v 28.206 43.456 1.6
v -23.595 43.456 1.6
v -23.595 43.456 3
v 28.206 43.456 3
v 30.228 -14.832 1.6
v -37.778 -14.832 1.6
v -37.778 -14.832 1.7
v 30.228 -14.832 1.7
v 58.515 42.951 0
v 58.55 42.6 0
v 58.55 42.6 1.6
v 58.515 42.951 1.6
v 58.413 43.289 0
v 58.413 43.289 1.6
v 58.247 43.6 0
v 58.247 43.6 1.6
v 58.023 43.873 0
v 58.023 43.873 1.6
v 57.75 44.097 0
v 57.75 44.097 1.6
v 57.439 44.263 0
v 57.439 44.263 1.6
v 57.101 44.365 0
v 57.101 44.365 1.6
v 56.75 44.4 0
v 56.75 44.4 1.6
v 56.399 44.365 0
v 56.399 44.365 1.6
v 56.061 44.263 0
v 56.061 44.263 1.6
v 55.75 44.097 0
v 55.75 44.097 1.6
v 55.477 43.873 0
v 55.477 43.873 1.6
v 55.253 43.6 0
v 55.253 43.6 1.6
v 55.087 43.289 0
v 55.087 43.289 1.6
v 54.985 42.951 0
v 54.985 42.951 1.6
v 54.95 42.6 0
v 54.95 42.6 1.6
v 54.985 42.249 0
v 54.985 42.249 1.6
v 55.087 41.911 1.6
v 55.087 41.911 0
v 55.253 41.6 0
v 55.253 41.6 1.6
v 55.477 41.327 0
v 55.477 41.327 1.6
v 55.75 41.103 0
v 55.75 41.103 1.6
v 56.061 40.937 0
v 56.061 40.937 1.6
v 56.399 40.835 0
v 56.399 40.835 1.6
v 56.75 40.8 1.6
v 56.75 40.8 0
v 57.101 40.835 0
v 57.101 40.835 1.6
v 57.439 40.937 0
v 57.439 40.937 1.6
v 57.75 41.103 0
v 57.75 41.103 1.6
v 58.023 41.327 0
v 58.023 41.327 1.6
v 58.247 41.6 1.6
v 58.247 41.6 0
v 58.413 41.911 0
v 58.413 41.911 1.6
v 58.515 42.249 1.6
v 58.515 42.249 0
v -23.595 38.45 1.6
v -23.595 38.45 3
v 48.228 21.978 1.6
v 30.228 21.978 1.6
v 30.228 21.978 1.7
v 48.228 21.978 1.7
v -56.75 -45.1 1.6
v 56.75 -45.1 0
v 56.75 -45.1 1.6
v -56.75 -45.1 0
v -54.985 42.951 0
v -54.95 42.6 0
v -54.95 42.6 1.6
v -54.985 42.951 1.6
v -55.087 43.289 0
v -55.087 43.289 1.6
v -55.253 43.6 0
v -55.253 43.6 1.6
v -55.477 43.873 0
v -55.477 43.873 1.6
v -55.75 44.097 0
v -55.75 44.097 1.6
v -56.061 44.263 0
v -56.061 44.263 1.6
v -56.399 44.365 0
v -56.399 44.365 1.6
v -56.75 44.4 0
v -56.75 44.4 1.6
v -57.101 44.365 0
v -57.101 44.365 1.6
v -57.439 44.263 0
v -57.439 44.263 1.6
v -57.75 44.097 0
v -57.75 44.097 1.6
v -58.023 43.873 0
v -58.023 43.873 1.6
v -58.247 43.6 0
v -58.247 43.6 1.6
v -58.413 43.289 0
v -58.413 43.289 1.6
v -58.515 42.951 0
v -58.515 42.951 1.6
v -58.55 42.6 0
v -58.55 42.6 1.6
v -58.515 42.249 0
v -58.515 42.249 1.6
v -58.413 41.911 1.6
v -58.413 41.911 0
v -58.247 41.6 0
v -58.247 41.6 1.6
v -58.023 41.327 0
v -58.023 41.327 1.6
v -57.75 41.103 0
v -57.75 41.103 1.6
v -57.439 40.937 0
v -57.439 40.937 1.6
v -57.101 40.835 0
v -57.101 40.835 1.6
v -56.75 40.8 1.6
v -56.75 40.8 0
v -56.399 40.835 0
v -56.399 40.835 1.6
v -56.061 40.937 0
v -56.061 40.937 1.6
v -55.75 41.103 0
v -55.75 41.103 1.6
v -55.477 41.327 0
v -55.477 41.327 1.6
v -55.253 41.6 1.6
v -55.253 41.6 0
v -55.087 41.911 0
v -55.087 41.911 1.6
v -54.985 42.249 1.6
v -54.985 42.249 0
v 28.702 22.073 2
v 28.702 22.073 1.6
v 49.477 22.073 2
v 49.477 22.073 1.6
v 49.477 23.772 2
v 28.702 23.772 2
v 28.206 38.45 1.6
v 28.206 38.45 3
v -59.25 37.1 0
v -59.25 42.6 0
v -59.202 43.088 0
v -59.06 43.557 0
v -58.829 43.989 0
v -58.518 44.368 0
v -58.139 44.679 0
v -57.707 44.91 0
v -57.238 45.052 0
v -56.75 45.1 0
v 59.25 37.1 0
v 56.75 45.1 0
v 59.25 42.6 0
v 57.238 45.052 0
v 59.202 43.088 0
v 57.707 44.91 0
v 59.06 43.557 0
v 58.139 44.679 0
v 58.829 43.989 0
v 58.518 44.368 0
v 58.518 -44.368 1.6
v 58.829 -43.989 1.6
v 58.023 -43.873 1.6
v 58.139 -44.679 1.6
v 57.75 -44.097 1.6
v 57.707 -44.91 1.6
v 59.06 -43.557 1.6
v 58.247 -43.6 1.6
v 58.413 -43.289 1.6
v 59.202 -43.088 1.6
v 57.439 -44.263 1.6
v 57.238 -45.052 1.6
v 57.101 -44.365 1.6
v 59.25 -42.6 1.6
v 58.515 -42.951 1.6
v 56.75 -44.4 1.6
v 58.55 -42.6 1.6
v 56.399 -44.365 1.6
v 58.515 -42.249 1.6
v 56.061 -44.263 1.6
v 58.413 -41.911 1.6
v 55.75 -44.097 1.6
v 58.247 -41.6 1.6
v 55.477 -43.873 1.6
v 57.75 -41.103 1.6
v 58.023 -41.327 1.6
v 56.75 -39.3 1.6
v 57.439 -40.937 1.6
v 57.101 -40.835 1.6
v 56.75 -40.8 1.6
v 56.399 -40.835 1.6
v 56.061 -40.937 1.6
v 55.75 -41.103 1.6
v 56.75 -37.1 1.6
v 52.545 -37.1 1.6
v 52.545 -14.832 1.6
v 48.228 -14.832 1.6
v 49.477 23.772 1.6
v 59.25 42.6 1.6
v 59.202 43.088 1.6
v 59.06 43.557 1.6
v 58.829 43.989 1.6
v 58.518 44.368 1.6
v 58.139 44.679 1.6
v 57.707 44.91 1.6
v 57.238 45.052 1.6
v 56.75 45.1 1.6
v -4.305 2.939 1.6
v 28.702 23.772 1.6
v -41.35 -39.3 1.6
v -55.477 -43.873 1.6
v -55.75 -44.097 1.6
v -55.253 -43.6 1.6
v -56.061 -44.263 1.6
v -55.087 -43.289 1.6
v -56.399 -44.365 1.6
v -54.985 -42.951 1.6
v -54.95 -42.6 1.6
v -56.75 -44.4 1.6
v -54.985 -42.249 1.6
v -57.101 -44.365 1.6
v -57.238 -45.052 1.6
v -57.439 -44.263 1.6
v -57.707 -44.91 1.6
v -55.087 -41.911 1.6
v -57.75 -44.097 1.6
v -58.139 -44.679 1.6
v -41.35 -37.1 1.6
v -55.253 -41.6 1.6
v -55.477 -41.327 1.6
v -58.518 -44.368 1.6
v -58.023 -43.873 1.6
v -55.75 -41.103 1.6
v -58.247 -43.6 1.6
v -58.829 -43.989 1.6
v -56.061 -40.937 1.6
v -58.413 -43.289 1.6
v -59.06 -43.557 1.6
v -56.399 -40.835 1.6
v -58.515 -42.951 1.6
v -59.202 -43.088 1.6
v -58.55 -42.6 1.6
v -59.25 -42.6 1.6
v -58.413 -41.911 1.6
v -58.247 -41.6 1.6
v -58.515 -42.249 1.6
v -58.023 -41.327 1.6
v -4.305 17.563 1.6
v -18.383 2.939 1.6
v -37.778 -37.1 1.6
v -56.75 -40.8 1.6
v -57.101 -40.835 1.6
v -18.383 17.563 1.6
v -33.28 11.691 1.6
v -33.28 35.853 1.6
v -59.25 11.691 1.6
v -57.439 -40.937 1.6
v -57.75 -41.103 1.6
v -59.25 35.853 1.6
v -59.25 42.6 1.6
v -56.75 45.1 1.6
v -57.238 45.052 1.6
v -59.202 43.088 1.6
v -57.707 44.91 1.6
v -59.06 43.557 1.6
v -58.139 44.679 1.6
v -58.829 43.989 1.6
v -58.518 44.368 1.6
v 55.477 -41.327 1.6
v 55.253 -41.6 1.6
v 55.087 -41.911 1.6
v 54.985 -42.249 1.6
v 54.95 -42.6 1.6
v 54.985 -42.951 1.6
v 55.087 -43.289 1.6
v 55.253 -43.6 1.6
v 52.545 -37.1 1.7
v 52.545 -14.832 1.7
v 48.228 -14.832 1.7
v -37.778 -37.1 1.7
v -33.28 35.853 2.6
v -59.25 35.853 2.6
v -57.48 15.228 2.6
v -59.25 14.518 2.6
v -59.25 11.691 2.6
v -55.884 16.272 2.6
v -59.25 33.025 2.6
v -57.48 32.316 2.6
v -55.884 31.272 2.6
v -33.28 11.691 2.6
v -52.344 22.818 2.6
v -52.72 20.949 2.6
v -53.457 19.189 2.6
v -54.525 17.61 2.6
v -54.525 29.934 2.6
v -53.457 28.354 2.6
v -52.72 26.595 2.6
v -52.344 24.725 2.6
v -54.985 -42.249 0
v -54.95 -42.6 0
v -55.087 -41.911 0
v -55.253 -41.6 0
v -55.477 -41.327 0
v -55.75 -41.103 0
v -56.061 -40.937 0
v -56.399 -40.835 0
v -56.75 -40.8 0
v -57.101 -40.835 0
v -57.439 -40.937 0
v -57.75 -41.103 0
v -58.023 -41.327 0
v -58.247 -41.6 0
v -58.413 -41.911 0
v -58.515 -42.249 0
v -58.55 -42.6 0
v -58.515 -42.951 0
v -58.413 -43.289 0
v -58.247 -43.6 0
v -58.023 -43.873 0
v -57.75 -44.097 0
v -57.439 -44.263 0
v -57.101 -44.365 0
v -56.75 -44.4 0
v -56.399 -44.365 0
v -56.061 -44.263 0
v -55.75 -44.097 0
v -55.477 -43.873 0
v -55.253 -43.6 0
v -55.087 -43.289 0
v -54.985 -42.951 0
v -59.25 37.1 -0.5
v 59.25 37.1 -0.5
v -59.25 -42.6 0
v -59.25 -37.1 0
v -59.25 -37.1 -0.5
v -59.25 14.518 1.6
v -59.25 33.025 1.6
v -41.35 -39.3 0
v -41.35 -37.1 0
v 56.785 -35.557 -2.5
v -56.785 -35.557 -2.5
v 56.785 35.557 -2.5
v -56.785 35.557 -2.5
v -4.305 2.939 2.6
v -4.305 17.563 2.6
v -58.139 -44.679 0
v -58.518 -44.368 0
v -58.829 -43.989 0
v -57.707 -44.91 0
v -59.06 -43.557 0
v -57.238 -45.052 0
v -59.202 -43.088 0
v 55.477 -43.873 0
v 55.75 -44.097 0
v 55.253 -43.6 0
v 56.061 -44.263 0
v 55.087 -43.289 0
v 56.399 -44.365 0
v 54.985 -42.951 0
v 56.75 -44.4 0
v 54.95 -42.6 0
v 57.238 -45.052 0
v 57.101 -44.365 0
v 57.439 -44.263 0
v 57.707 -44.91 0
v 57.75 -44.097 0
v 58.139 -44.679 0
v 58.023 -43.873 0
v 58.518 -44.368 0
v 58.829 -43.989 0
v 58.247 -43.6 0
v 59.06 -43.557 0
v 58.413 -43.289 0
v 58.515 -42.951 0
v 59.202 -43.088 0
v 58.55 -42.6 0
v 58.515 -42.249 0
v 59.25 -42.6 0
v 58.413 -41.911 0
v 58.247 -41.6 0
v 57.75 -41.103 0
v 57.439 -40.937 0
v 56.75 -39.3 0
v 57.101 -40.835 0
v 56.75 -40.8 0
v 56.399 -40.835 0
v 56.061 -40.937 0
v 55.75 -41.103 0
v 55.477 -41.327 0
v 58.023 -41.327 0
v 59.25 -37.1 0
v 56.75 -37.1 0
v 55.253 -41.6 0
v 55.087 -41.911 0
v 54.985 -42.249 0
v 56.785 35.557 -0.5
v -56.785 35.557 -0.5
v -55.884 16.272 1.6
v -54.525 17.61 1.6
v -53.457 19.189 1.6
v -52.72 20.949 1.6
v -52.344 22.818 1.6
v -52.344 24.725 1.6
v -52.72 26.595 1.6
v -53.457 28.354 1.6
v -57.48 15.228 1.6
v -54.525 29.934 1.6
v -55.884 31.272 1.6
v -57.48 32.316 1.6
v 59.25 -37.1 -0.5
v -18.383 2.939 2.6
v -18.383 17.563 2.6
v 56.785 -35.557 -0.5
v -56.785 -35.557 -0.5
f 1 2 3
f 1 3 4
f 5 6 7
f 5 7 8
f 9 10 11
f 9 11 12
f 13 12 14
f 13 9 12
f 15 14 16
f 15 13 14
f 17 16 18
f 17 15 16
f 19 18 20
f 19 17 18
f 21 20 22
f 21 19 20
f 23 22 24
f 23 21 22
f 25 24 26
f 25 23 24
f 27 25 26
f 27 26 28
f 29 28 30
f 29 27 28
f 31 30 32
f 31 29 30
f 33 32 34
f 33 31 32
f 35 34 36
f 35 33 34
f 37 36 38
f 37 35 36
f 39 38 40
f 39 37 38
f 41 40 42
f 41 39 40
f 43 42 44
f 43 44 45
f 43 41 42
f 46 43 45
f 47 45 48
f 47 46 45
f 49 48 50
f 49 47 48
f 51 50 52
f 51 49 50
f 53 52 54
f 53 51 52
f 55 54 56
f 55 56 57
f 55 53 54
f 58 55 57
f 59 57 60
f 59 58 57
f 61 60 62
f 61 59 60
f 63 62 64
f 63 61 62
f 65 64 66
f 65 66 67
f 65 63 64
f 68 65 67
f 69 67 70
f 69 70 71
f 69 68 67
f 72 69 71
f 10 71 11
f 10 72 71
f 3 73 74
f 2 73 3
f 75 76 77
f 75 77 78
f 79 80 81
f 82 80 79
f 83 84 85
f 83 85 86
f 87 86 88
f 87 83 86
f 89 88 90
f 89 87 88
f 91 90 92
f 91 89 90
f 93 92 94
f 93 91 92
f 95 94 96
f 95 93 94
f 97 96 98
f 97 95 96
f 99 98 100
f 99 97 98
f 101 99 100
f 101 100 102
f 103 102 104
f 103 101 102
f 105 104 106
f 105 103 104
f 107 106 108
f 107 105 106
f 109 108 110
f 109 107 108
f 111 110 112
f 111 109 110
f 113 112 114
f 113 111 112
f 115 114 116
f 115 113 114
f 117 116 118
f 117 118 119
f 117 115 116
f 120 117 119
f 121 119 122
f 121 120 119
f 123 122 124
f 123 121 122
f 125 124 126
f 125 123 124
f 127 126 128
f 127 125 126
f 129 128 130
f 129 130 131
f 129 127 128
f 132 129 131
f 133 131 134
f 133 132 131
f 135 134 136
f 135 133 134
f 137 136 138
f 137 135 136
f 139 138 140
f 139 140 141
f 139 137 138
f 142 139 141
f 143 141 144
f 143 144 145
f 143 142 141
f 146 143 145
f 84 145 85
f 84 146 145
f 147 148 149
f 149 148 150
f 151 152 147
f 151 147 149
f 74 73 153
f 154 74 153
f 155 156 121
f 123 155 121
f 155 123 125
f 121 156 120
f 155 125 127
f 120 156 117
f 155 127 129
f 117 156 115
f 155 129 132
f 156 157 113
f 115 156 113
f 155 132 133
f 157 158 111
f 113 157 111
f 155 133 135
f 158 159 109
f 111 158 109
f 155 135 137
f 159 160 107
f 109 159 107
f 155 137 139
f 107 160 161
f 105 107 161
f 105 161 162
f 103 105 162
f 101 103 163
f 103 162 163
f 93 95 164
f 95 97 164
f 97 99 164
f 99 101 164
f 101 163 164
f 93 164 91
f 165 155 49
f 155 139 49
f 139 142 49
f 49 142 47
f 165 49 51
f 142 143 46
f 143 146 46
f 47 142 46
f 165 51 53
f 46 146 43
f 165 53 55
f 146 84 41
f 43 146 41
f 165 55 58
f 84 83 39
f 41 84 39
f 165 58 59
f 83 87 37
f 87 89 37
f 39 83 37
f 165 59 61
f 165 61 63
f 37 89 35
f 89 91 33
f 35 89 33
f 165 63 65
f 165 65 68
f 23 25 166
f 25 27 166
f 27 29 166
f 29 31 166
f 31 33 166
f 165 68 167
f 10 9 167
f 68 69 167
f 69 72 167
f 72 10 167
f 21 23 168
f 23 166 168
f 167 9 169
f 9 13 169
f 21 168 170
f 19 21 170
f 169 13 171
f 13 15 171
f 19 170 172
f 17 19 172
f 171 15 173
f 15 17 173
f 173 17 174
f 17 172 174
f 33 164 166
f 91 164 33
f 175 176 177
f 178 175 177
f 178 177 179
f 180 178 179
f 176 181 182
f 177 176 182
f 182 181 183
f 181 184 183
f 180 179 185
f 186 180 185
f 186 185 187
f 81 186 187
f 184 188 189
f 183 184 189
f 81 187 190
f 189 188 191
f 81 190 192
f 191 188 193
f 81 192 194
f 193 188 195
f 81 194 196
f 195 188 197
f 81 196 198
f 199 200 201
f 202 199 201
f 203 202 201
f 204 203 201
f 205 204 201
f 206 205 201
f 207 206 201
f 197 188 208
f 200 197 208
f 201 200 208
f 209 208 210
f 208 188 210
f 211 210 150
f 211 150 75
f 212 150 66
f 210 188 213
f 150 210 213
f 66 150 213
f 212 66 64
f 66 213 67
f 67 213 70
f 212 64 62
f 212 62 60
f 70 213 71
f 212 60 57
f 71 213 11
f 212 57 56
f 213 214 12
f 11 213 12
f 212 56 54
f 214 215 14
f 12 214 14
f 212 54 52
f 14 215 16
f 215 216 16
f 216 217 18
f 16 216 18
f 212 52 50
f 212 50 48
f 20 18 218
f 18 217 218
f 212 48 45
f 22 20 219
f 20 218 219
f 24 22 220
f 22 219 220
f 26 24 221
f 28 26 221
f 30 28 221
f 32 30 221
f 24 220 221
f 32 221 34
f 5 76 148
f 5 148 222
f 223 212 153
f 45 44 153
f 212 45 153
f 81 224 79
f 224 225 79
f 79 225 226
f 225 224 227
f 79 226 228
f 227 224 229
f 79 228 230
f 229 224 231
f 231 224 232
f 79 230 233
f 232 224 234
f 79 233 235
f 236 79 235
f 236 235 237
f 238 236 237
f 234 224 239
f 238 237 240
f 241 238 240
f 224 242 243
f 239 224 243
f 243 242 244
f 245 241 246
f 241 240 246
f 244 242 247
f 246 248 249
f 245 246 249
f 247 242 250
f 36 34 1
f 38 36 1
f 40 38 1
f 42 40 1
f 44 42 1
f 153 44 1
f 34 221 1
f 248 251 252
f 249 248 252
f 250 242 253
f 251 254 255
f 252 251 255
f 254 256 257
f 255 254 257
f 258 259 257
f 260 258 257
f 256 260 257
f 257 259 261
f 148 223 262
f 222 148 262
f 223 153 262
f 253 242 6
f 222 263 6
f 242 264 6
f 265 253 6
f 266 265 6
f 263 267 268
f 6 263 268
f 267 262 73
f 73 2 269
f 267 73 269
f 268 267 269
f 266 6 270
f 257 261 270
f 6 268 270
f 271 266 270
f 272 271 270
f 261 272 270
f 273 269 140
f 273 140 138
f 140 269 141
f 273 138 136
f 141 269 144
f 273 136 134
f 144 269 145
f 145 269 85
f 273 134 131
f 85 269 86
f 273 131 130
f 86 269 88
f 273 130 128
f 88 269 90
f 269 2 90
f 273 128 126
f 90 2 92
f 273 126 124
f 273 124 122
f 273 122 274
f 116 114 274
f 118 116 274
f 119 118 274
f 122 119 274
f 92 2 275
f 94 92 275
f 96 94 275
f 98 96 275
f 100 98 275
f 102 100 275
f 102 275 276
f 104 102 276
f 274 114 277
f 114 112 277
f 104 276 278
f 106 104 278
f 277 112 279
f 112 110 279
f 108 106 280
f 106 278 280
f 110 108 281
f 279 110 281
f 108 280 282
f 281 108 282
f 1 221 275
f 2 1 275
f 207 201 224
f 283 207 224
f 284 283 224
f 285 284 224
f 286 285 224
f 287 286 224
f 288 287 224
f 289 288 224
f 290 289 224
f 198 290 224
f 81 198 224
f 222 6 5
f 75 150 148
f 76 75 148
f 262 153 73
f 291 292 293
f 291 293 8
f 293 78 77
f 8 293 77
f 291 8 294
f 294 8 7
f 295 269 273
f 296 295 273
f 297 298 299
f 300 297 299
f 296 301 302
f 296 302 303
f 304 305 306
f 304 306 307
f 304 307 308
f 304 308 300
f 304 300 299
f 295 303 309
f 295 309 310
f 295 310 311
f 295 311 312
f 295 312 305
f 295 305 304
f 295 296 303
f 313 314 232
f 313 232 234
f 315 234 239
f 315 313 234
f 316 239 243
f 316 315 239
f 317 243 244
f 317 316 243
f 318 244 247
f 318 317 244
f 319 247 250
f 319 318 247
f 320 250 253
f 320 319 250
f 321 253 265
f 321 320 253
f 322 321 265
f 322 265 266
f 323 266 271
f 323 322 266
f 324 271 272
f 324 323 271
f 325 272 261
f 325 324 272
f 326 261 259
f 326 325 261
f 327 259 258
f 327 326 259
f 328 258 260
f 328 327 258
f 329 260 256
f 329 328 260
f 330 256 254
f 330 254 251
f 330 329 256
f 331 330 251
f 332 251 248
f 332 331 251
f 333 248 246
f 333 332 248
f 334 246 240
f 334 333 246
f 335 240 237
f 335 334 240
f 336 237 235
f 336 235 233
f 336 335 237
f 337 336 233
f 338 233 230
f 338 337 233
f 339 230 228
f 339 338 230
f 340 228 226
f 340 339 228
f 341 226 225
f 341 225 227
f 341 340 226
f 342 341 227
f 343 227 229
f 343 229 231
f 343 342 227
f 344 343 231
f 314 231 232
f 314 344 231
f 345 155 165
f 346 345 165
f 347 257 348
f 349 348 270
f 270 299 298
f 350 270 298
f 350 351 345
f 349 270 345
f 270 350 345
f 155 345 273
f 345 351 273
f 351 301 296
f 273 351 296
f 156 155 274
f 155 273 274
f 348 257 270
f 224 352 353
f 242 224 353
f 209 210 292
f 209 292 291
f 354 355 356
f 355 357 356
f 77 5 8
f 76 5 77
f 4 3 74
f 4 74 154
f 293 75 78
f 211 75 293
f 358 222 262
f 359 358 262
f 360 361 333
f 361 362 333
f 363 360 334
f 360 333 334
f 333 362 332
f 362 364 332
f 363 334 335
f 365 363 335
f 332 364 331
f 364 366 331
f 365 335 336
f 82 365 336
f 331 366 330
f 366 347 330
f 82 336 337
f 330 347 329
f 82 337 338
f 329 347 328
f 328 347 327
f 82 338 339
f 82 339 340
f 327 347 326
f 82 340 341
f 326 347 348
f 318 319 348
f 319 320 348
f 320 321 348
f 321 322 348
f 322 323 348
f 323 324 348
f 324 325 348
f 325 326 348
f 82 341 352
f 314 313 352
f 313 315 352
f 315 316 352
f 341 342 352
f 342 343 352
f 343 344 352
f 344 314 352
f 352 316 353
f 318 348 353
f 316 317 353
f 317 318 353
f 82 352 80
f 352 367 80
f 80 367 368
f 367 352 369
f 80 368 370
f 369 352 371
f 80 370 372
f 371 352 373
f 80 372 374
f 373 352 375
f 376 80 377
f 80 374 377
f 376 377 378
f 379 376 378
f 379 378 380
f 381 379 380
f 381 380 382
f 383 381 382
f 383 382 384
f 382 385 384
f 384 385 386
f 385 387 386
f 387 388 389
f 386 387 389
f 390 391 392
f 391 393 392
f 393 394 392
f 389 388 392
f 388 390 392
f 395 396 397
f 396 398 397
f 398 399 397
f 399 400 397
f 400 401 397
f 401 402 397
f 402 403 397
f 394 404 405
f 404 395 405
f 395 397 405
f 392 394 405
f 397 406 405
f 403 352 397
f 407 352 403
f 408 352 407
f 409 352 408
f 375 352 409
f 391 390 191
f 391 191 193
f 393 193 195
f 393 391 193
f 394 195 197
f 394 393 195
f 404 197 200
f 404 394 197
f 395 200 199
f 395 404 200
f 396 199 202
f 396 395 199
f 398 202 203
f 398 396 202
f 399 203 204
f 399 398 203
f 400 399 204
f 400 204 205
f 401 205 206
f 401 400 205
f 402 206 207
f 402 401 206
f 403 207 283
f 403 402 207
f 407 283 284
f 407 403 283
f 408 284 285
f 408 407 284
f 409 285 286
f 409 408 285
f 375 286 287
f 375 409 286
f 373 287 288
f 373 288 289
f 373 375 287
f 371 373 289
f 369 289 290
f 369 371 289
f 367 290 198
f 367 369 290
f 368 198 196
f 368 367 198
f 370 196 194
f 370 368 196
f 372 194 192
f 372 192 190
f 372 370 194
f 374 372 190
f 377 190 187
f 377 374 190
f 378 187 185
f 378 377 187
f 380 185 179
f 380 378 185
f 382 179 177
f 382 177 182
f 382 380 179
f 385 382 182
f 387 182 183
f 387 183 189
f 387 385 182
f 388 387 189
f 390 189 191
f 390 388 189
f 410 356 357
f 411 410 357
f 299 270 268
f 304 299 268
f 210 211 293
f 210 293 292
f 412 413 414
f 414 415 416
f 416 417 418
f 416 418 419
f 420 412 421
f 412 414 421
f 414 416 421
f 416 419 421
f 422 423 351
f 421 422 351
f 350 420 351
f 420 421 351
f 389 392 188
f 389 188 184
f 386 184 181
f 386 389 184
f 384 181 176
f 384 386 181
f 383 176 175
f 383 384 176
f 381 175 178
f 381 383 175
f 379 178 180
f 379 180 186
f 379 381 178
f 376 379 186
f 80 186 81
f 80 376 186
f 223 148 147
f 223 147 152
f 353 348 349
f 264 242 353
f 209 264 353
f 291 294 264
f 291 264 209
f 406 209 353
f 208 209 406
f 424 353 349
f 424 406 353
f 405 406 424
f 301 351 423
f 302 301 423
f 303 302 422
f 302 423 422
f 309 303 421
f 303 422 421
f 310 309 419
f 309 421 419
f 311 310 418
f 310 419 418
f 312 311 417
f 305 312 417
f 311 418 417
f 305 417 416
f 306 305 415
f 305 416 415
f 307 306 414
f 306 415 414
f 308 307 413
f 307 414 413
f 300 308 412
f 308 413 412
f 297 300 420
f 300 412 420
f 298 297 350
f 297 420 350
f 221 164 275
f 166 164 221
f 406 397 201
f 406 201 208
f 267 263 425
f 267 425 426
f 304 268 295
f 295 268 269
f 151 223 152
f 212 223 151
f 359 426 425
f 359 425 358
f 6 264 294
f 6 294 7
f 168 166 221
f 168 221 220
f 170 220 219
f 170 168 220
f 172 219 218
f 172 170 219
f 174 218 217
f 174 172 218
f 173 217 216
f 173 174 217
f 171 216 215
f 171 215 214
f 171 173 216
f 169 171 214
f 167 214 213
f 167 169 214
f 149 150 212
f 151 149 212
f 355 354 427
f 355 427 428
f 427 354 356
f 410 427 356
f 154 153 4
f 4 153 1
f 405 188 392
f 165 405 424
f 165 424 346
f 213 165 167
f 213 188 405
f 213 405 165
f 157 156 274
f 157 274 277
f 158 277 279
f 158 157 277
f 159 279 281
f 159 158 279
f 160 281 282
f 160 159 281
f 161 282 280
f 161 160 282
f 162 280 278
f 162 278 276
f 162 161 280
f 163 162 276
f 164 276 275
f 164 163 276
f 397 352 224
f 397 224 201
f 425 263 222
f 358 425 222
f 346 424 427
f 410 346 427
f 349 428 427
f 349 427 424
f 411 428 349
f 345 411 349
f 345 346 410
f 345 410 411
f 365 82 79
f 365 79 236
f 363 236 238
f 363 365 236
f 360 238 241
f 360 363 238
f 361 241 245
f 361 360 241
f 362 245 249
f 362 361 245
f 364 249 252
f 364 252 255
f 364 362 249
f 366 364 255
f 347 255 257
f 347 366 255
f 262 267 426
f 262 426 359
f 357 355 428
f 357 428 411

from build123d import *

# Parameters (mm, degrees)
SKETCH1_R           = 1.8
SKETCH1_W           = 98.1
SKETCH1_H           = 2.2
BOSS_EXTRUDE1_DEPTH = 1.6
BOSS_EXTRUDE2_DEPTH = 1
SKETCH4_W           = 14.077668093
SKETCH4_H           = 14.62437365
BOSS_EXTRUDE3_DEPTH = 1
SKETCH5_W           = 20.774811166
SKETCH5_H           = 1.698532112
BOSS_EXTRUDE4_DEPTH = 2
BOSS_EXTRUDE5_DEPTH = 0.1
SKETCH7_W           = 118.5
SKETCH7_H           = 74.2
BOSS_EXTRUDE6_DEPTH = 2.5
SKETCH9_W           = 118.5
SKETCH9_H           = 74.2
SKETCH9_W_2         = 113.57001823
SKETCH9_H_2         = 71.11304095
CUT_EXTRUDE1_DEPTH  = 2
SKETCH10_W          = 51.801411065
SKETCH10_H          = 5.00599424
BOSS_EXTRUDE7_DEPTH = 3


with BuildPart() as part:
    # Sketch1 → Boss-Extrude1 (new body)
    with BuildSketch(Plane.XY):
        with BuildLine():
            Line((-56.75, 45.1), (56.75, 45.1))
            ThreePointArc((56.75, 45.1), (58.517766953, 44.367766953), (59.25, 42.6))
            Line((59.25, 42.6), (59.25, -42.6))
            ThreePointArc((59.25, -42.6), (58.517766953, -44.367766953), (56.75, -45.1))
            Line((56.75, -45.1), (-56.75, -45.1))
            ThreePointArc((-56.75, -45.1), (-58.517766953, -44.367766953), (-59.25, -42.6))
            Line((-59.25, -42.6), (-59.25, 42.6))
            ThreePointArc((-59.25, 42.6), (-58.517766953, 44.367766953), (-56.75, 45.1))
        make_face()
        with Locations((-56.75, 42.6)):
            Circle(SKETCH1_R, mode=Mode.SUBTRACT)
        with Locations((-56.75, -42.6)):
            Circle(SKETCH1_R, mode=Mode.SUBTRACT)
        with Locations((56.75, -42.6)):
            Circle(SKETCH1_R, mode=Mode.SUBTRACT)
        with Locations((56.75, 42.6)):
            Circle(SKETCH1_R, mode=Mode.SUBTRACT)
        with Locations((7.7, -38.2)):
            Rectangle(SKETCH1_W, SKETCH1_H, mode=Mode.SUBTRACT)
    extrude(amount=BOSS_EXTRUDE1_DEPTH)

    # Sketch2 → Boss-Extrude2 (add)
    with BuildSketch(Plane.XY.offset(1.6)):
        with BuildLine():
            Line((-33.280179083, 35.852893933), (-59.25, 35.852893933))
            Line((-59.25, 35.852893933), (-59.25, 33.025293605))
            ThreePointArc((-59.25, 33.025293605), (-52.297040321, 23.771768976), (-59.25, 14.518244348))
            Line((-59.25, 14.518244348), (-59.25, 11.690644019))
            Line((-59.25, 11.690644019), (-33.280179083, 11.690644019))
            Line((-33.280179083, 11.690644019), (-33.280179083, 35.852893933))
        make_face()
    extrude(amount=BOSS_EXTRUDE2_DEPTH)

    # Sketch4 → Boss-Extrude3 (add)
    with BuildSketch(Plane.XY.offset(1.6)):
        with Locations((-11.344165308, 10.250729194)):
            Rectangle(SKETCH4_W, SKETCH4_H)
    extrude(amount=BOSS_EXTRUDE3_DEPTH)

    # Sketch5 → Boss-Extrude4 (add)
    with BuildSketch(Plane.XY):
        with Locations((39.089422326, 22.92250292)):
            Rectangle(SKETCH5_W, SKETCH5_H)
    extrude(amount=BOSS_EXTRUDE4_DEPTH)

    # Sketch6 → Boss-Extrude5 (add)
    with BuildSketch(Plane.XY.offset(1.6)):
        Polygon((30.227507475, 21.978150543), (48.227507475, 21.978150543), (48.227507475, -14.831552551), (52.545445223, -14.831552551), (52.545445223, -37.1), (-37.778090805, -37.1), (-37.778090805, -14.831552551), (30.227507475, -14.831552551), align=None)
    extrude(amount=BOSS_EXTRUDE5_DEPTH)

    # Sketch7 → Boss-Extrude6 (add)
    with BuildSketch(Plane.XY):
        Rectangle(SKETCH7_W, SKETCH7_H)
    extrude(amount=-BOSS_EXTRUDE6_DEPTH)

    # Sketch9 → Cut-Extrude1 (cut)
    with BuildSketch(Plane(origin=(0, 0, -2.5), x_dir=(-1, 0, 0), z_dir=(0, 0, -1))):
        Rectangle(SKETCH9_W, SKETCH9_H)
        Rectangle(SKETCH9_W_2, SKETCH9_H_2, mode=Mode.SUBTRACT)
    extrude(amount=-CUT_EXTRUDE1_DEPTH, mode=Mode.SUBTRACT)

    # Sketch10 → Boss-Extrude7 (add)
    with BuildSketch(Plane.XY):
        with Locations((2.305465736, 40.952943313)):
            Rectangle(SKETCH10_W, SKETCH10_H)
    extrude(amount=BOSS_EXTRUDE7_DEPTH)


solid = part.part
